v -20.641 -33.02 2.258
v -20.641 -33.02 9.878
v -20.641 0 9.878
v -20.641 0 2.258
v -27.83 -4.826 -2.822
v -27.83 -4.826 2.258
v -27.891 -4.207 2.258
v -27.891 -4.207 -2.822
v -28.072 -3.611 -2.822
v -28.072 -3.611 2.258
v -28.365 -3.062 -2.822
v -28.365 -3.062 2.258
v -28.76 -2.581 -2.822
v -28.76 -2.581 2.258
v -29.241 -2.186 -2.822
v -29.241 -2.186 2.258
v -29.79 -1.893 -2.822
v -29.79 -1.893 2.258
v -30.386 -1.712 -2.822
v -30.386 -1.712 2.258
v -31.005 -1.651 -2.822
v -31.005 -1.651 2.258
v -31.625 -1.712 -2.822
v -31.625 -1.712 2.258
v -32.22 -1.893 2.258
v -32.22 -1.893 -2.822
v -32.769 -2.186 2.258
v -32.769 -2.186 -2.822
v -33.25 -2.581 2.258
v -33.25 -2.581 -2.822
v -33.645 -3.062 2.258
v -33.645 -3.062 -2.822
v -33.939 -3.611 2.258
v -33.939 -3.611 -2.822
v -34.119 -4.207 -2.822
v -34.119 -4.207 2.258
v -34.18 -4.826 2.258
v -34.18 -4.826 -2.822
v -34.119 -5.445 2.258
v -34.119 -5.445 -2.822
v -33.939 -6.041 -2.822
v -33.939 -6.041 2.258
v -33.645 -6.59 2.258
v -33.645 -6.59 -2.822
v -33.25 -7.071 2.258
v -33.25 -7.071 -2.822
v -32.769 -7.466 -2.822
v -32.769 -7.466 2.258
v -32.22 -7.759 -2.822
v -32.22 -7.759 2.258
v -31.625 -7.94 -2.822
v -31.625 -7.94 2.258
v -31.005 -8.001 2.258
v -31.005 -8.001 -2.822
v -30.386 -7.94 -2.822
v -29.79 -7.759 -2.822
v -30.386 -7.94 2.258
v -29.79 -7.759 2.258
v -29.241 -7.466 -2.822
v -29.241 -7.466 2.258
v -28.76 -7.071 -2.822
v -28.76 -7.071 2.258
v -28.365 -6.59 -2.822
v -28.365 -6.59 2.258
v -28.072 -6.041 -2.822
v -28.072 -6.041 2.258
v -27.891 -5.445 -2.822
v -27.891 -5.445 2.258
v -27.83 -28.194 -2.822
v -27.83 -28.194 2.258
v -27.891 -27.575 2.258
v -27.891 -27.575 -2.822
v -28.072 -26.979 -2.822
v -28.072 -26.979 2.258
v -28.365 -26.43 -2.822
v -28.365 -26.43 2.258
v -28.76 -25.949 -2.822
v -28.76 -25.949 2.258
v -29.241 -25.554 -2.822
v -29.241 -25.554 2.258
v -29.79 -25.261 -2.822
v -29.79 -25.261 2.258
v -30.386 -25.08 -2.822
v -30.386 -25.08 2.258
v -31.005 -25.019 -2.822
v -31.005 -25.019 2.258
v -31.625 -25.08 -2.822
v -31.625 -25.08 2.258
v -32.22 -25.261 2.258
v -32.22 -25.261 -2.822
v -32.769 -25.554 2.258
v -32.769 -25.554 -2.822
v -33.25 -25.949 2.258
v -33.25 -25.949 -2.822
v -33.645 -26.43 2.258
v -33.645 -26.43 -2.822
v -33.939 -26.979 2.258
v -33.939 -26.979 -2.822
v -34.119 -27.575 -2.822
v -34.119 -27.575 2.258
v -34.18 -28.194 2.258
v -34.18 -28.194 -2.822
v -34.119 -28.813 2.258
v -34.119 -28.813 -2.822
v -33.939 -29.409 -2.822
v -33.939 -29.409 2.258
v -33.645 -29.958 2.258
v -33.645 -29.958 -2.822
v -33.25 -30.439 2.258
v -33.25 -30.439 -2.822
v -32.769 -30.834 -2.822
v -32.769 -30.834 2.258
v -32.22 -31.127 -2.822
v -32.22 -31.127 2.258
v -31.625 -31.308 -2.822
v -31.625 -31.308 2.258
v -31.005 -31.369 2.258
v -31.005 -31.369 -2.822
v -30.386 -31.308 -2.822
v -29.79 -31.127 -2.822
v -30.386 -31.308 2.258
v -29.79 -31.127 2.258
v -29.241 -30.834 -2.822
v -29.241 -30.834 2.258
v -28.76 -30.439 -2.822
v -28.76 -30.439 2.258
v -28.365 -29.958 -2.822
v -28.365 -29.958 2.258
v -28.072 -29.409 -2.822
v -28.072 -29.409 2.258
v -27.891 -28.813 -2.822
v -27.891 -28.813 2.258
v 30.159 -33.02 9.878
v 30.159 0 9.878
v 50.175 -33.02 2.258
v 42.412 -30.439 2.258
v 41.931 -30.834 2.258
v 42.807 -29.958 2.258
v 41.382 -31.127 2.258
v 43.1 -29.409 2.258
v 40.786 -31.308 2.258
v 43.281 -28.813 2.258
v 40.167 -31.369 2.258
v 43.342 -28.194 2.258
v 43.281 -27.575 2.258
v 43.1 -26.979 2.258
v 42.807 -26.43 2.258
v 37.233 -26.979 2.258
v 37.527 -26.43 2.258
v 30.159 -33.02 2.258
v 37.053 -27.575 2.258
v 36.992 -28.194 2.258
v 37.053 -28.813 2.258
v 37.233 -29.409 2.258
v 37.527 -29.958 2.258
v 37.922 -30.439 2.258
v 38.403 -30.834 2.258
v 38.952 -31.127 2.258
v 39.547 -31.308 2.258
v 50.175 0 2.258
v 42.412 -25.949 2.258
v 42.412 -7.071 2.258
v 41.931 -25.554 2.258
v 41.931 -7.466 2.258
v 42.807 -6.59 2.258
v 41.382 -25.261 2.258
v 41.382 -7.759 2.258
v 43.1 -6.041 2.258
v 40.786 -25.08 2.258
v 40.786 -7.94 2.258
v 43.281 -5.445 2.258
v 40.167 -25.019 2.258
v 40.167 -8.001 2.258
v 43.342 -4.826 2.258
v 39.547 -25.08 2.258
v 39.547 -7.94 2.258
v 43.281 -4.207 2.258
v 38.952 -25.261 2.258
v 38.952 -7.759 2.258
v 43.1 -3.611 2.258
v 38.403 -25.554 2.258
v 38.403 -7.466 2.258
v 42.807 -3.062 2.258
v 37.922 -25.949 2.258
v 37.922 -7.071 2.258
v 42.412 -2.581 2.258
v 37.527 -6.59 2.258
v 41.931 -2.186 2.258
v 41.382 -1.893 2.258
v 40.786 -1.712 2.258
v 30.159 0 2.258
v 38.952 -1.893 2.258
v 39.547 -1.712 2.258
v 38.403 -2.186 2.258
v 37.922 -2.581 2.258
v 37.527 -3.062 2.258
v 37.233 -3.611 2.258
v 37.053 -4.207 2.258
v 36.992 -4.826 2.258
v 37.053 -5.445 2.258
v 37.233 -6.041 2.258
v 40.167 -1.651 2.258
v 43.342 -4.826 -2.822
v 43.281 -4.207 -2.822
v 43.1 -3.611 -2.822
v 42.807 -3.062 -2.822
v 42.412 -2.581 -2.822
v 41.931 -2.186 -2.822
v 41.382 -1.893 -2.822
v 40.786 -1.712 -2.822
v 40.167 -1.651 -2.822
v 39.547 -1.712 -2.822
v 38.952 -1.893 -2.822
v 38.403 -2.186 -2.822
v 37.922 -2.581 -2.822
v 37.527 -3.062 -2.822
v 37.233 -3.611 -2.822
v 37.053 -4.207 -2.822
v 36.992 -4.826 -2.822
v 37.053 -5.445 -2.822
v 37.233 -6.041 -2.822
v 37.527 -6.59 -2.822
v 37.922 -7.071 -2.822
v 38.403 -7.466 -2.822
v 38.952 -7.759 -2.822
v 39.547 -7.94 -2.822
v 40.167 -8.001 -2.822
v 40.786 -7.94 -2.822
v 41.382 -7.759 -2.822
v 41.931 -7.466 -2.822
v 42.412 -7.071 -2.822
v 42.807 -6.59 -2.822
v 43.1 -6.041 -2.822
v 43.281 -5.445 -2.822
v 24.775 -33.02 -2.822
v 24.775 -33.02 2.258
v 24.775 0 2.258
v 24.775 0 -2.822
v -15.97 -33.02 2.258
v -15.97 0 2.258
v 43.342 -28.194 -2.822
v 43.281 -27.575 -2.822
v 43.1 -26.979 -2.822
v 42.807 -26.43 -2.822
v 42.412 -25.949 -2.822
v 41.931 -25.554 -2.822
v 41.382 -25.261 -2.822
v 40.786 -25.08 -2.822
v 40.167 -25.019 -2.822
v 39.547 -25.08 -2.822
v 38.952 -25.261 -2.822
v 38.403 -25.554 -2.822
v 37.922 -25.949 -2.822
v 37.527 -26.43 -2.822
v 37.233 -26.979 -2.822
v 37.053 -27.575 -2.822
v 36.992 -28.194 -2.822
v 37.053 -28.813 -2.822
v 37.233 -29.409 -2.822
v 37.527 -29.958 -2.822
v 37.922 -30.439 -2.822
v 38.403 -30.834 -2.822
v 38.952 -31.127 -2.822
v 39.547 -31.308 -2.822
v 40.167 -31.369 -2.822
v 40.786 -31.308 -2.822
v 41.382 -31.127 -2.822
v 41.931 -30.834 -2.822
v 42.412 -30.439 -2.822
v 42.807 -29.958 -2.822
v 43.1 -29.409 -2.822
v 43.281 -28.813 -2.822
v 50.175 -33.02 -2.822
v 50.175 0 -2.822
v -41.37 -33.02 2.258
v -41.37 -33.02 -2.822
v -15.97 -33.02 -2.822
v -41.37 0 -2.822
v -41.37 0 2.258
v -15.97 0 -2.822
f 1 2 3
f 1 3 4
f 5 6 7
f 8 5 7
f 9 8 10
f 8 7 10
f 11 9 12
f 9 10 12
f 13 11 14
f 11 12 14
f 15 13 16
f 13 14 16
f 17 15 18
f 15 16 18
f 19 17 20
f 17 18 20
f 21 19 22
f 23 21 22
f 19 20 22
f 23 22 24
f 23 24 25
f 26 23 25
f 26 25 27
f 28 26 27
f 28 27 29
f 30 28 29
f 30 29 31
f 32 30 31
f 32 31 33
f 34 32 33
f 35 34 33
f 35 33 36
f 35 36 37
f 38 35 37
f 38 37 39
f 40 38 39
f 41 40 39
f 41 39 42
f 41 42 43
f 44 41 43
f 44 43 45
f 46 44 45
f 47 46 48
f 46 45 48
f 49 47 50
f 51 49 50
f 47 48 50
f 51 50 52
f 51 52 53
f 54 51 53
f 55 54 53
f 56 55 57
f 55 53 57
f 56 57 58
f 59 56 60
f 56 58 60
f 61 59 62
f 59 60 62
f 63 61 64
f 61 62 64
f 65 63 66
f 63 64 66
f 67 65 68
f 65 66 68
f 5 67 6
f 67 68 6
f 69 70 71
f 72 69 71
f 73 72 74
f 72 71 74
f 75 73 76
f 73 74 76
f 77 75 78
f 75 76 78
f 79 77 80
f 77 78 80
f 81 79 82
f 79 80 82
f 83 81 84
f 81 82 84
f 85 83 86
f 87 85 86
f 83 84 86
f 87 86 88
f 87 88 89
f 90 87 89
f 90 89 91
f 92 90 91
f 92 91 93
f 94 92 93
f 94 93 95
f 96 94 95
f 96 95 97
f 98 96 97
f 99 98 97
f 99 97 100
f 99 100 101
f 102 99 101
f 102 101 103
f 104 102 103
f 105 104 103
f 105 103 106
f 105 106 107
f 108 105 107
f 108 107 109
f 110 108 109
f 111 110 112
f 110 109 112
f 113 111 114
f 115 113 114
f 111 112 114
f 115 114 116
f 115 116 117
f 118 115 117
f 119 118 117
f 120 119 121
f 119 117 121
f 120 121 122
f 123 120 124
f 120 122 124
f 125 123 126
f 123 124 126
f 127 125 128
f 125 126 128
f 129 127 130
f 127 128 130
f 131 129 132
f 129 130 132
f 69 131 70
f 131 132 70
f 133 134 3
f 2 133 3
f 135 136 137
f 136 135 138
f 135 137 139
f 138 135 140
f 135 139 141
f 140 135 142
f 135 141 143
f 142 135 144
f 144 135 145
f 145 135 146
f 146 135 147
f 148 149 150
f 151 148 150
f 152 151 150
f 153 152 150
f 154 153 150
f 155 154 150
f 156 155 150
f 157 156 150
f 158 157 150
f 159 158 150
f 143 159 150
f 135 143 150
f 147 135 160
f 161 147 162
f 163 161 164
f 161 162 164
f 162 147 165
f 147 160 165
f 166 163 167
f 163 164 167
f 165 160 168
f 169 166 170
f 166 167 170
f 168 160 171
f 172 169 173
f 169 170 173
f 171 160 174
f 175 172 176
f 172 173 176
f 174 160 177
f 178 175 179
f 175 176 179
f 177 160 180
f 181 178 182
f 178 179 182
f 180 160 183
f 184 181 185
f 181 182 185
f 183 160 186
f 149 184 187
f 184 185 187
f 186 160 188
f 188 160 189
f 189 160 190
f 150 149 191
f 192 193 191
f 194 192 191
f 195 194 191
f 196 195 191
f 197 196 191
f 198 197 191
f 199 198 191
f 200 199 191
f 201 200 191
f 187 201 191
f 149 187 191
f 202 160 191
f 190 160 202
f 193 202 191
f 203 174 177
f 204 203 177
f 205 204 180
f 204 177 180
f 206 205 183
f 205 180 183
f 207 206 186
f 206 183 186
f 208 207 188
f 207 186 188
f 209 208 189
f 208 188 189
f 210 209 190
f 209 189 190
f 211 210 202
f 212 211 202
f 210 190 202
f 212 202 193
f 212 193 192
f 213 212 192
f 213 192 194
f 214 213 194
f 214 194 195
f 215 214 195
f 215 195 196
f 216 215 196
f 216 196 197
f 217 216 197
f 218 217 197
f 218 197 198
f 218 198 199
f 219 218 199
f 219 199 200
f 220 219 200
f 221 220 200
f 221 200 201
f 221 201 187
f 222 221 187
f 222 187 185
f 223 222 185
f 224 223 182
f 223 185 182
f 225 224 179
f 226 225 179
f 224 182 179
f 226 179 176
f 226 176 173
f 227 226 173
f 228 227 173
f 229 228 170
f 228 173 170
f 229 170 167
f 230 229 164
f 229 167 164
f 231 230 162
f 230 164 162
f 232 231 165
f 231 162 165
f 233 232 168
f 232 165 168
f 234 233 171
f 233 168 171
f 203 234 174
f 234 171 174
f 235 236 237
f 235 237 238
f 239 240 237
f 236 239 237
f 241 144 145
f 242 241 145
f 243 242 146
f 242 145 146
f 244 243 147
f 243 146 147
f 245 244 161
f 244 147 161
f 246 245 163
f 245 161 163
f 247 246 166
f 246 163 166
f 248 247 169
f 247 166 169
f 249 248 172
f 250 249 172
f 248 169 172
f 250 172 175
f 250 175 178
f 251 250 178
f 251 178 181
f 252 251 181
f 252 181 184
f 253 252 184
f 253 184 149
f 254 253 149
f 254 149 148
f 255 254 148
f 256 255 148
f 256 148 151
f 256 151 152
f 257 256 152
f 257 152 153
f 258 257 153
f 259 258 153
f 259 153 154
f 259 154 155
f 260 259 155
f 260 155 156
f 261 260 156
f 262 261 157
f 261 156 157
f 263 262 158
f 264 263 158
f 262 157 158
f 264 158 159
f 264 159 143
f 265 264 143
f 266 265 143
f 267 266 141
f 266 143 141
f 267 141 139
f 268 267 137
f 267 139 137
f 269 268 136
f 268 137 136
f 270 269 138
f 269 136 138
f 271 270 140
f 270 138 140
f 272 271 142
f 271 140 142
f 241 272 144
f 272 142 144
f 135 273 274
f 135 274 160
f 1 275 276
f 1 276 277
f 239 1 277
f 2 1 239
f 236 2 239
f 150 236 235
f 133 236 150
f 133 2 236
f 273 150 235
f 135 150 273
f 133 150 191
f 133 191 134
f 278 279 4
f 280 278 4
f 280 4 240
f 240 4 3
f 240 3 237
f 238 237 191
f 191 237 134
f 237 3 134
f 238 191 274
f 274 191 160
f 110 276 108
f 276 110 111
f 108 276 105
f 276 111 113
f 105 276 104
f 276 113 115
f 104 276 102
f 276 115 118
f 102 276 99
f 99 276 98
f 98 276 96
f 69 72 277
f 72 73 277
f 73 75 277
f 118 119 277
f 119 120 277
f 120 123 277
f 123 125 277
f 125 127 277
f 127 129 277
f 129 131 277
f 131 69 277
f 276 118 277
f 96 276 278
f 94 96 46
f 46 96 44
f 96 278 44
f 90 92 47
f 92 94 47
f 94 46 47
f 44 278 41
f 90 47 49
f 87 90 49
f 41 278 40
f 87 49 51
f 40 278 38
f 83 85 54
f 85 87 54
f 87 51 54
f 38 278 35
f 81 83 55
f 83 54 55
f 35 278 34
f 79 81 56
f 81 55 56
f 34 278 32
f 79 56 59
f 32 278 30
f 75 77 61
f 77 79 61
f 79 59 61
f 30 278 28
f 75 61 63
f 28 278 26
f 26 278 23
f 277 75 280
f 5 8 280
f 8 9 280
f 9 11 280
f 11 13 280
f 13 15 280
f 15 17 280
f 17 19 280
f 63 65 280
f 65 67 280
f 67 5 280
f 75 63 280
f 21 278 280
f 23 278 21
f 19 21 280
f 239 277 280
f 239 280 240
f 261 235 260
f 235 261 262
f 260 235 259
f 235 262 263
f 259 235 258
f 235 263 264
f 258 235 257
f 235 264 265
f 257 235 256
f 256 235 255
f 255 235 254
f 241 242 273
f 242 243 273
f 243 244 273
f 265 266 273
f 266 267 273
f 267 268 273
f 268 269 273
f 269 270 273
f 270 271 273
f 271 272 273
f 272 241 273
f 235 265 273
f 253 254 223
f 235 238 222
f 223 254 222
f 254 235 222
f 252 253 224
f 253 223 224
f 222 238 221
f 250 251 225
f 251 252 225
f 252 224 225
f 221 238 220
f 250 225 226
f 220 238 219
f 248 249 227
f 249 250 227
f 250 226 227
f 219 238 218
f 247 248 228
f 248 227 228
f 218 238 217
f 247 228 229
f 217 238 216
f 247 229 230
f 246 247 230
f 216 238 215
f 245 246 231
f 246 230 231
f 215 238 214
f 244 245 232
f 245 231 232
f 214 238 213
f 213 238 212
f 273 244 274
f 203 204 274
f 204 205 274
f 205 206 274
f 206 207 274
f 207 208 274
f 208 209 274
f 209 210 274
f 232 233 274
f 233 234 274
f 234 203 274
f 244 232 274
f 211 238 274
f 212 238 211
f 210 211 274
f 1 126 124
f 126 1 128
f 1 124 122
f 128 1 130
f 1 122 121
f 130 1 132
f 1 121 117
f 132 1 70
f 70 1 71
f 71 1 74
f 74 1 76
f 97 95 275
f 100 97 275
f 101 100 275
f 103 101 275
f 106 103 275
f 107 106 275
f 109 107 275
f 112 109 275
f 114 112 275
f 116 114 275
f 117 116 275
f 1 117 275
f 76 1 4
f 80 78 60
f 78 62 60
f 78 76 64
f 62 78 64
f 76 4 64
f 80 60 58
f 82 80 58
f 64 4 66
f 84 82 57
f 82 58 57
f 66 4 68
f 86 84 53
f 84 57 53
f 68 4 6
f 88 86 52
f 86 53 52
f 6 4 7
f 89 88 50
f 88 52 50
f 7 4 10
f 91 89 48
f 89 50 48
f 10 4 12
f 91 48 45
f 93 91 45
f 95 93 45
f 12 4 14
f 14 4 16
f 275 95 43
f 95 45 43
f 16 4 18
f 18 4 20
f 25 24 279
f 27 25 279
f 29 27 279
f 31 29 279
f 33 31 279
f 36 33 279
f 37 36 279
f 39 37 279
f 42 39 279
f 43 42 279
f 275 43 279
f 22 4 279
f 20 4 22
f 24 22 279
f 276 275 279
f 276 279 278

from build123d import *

# Parameters (mm, degrees)
F1_DEPTH = 33.02
F2_R     = 3.175
F3_DEPTH = 25.4
F4_R     = 3.175
F5_DEPTH = 25.4


with BuildPart() as f1:
    # F0 (on Front) → F1 (new body)
    with BuildSketch(Plane.XZ):
        Polygon((30.158872, 9.877618), (-20.641128, 9.877618), (-20.641128, 2.257618), (-41.369699, 2.257618), (-41.369699, -2.822382), (-15.969699, -2.822382), (-15.969699, 2.257618), (24.7747, 2.257618), (24.7747, -2.822382), (50.1747, -2.822382), (50.1747, 2.257618), (30.158872, 2.257618), align=None)
    extrude(amount=F1_DEPTH)

    # F2 (on face) → F3 (cut)
    with BuildSketch(Plane.XY.offset(2.257618)):
        with Locations((-31.005413, -28.194)):
            Circle(F2_R)
        with Locations((-31.005413, -4.826)):
            Circle(F2_R)
    extrude(amount=-F3_DEPTH, mode=Mode.SUBTRACT)

    # F4 (on face) → F5 (cut)
    with BuildSketch(Plane.XY.offset(2.257618)):
        with Locations((40.166786, -4.826)):
            Circle(F4_R)
        with Locations((40.166786, -28.194)):
            Circle(F4_R)
    extrude(amount=-F5_DEPTH, mode=Mode.SUBTRACT)


solid = f1.part
